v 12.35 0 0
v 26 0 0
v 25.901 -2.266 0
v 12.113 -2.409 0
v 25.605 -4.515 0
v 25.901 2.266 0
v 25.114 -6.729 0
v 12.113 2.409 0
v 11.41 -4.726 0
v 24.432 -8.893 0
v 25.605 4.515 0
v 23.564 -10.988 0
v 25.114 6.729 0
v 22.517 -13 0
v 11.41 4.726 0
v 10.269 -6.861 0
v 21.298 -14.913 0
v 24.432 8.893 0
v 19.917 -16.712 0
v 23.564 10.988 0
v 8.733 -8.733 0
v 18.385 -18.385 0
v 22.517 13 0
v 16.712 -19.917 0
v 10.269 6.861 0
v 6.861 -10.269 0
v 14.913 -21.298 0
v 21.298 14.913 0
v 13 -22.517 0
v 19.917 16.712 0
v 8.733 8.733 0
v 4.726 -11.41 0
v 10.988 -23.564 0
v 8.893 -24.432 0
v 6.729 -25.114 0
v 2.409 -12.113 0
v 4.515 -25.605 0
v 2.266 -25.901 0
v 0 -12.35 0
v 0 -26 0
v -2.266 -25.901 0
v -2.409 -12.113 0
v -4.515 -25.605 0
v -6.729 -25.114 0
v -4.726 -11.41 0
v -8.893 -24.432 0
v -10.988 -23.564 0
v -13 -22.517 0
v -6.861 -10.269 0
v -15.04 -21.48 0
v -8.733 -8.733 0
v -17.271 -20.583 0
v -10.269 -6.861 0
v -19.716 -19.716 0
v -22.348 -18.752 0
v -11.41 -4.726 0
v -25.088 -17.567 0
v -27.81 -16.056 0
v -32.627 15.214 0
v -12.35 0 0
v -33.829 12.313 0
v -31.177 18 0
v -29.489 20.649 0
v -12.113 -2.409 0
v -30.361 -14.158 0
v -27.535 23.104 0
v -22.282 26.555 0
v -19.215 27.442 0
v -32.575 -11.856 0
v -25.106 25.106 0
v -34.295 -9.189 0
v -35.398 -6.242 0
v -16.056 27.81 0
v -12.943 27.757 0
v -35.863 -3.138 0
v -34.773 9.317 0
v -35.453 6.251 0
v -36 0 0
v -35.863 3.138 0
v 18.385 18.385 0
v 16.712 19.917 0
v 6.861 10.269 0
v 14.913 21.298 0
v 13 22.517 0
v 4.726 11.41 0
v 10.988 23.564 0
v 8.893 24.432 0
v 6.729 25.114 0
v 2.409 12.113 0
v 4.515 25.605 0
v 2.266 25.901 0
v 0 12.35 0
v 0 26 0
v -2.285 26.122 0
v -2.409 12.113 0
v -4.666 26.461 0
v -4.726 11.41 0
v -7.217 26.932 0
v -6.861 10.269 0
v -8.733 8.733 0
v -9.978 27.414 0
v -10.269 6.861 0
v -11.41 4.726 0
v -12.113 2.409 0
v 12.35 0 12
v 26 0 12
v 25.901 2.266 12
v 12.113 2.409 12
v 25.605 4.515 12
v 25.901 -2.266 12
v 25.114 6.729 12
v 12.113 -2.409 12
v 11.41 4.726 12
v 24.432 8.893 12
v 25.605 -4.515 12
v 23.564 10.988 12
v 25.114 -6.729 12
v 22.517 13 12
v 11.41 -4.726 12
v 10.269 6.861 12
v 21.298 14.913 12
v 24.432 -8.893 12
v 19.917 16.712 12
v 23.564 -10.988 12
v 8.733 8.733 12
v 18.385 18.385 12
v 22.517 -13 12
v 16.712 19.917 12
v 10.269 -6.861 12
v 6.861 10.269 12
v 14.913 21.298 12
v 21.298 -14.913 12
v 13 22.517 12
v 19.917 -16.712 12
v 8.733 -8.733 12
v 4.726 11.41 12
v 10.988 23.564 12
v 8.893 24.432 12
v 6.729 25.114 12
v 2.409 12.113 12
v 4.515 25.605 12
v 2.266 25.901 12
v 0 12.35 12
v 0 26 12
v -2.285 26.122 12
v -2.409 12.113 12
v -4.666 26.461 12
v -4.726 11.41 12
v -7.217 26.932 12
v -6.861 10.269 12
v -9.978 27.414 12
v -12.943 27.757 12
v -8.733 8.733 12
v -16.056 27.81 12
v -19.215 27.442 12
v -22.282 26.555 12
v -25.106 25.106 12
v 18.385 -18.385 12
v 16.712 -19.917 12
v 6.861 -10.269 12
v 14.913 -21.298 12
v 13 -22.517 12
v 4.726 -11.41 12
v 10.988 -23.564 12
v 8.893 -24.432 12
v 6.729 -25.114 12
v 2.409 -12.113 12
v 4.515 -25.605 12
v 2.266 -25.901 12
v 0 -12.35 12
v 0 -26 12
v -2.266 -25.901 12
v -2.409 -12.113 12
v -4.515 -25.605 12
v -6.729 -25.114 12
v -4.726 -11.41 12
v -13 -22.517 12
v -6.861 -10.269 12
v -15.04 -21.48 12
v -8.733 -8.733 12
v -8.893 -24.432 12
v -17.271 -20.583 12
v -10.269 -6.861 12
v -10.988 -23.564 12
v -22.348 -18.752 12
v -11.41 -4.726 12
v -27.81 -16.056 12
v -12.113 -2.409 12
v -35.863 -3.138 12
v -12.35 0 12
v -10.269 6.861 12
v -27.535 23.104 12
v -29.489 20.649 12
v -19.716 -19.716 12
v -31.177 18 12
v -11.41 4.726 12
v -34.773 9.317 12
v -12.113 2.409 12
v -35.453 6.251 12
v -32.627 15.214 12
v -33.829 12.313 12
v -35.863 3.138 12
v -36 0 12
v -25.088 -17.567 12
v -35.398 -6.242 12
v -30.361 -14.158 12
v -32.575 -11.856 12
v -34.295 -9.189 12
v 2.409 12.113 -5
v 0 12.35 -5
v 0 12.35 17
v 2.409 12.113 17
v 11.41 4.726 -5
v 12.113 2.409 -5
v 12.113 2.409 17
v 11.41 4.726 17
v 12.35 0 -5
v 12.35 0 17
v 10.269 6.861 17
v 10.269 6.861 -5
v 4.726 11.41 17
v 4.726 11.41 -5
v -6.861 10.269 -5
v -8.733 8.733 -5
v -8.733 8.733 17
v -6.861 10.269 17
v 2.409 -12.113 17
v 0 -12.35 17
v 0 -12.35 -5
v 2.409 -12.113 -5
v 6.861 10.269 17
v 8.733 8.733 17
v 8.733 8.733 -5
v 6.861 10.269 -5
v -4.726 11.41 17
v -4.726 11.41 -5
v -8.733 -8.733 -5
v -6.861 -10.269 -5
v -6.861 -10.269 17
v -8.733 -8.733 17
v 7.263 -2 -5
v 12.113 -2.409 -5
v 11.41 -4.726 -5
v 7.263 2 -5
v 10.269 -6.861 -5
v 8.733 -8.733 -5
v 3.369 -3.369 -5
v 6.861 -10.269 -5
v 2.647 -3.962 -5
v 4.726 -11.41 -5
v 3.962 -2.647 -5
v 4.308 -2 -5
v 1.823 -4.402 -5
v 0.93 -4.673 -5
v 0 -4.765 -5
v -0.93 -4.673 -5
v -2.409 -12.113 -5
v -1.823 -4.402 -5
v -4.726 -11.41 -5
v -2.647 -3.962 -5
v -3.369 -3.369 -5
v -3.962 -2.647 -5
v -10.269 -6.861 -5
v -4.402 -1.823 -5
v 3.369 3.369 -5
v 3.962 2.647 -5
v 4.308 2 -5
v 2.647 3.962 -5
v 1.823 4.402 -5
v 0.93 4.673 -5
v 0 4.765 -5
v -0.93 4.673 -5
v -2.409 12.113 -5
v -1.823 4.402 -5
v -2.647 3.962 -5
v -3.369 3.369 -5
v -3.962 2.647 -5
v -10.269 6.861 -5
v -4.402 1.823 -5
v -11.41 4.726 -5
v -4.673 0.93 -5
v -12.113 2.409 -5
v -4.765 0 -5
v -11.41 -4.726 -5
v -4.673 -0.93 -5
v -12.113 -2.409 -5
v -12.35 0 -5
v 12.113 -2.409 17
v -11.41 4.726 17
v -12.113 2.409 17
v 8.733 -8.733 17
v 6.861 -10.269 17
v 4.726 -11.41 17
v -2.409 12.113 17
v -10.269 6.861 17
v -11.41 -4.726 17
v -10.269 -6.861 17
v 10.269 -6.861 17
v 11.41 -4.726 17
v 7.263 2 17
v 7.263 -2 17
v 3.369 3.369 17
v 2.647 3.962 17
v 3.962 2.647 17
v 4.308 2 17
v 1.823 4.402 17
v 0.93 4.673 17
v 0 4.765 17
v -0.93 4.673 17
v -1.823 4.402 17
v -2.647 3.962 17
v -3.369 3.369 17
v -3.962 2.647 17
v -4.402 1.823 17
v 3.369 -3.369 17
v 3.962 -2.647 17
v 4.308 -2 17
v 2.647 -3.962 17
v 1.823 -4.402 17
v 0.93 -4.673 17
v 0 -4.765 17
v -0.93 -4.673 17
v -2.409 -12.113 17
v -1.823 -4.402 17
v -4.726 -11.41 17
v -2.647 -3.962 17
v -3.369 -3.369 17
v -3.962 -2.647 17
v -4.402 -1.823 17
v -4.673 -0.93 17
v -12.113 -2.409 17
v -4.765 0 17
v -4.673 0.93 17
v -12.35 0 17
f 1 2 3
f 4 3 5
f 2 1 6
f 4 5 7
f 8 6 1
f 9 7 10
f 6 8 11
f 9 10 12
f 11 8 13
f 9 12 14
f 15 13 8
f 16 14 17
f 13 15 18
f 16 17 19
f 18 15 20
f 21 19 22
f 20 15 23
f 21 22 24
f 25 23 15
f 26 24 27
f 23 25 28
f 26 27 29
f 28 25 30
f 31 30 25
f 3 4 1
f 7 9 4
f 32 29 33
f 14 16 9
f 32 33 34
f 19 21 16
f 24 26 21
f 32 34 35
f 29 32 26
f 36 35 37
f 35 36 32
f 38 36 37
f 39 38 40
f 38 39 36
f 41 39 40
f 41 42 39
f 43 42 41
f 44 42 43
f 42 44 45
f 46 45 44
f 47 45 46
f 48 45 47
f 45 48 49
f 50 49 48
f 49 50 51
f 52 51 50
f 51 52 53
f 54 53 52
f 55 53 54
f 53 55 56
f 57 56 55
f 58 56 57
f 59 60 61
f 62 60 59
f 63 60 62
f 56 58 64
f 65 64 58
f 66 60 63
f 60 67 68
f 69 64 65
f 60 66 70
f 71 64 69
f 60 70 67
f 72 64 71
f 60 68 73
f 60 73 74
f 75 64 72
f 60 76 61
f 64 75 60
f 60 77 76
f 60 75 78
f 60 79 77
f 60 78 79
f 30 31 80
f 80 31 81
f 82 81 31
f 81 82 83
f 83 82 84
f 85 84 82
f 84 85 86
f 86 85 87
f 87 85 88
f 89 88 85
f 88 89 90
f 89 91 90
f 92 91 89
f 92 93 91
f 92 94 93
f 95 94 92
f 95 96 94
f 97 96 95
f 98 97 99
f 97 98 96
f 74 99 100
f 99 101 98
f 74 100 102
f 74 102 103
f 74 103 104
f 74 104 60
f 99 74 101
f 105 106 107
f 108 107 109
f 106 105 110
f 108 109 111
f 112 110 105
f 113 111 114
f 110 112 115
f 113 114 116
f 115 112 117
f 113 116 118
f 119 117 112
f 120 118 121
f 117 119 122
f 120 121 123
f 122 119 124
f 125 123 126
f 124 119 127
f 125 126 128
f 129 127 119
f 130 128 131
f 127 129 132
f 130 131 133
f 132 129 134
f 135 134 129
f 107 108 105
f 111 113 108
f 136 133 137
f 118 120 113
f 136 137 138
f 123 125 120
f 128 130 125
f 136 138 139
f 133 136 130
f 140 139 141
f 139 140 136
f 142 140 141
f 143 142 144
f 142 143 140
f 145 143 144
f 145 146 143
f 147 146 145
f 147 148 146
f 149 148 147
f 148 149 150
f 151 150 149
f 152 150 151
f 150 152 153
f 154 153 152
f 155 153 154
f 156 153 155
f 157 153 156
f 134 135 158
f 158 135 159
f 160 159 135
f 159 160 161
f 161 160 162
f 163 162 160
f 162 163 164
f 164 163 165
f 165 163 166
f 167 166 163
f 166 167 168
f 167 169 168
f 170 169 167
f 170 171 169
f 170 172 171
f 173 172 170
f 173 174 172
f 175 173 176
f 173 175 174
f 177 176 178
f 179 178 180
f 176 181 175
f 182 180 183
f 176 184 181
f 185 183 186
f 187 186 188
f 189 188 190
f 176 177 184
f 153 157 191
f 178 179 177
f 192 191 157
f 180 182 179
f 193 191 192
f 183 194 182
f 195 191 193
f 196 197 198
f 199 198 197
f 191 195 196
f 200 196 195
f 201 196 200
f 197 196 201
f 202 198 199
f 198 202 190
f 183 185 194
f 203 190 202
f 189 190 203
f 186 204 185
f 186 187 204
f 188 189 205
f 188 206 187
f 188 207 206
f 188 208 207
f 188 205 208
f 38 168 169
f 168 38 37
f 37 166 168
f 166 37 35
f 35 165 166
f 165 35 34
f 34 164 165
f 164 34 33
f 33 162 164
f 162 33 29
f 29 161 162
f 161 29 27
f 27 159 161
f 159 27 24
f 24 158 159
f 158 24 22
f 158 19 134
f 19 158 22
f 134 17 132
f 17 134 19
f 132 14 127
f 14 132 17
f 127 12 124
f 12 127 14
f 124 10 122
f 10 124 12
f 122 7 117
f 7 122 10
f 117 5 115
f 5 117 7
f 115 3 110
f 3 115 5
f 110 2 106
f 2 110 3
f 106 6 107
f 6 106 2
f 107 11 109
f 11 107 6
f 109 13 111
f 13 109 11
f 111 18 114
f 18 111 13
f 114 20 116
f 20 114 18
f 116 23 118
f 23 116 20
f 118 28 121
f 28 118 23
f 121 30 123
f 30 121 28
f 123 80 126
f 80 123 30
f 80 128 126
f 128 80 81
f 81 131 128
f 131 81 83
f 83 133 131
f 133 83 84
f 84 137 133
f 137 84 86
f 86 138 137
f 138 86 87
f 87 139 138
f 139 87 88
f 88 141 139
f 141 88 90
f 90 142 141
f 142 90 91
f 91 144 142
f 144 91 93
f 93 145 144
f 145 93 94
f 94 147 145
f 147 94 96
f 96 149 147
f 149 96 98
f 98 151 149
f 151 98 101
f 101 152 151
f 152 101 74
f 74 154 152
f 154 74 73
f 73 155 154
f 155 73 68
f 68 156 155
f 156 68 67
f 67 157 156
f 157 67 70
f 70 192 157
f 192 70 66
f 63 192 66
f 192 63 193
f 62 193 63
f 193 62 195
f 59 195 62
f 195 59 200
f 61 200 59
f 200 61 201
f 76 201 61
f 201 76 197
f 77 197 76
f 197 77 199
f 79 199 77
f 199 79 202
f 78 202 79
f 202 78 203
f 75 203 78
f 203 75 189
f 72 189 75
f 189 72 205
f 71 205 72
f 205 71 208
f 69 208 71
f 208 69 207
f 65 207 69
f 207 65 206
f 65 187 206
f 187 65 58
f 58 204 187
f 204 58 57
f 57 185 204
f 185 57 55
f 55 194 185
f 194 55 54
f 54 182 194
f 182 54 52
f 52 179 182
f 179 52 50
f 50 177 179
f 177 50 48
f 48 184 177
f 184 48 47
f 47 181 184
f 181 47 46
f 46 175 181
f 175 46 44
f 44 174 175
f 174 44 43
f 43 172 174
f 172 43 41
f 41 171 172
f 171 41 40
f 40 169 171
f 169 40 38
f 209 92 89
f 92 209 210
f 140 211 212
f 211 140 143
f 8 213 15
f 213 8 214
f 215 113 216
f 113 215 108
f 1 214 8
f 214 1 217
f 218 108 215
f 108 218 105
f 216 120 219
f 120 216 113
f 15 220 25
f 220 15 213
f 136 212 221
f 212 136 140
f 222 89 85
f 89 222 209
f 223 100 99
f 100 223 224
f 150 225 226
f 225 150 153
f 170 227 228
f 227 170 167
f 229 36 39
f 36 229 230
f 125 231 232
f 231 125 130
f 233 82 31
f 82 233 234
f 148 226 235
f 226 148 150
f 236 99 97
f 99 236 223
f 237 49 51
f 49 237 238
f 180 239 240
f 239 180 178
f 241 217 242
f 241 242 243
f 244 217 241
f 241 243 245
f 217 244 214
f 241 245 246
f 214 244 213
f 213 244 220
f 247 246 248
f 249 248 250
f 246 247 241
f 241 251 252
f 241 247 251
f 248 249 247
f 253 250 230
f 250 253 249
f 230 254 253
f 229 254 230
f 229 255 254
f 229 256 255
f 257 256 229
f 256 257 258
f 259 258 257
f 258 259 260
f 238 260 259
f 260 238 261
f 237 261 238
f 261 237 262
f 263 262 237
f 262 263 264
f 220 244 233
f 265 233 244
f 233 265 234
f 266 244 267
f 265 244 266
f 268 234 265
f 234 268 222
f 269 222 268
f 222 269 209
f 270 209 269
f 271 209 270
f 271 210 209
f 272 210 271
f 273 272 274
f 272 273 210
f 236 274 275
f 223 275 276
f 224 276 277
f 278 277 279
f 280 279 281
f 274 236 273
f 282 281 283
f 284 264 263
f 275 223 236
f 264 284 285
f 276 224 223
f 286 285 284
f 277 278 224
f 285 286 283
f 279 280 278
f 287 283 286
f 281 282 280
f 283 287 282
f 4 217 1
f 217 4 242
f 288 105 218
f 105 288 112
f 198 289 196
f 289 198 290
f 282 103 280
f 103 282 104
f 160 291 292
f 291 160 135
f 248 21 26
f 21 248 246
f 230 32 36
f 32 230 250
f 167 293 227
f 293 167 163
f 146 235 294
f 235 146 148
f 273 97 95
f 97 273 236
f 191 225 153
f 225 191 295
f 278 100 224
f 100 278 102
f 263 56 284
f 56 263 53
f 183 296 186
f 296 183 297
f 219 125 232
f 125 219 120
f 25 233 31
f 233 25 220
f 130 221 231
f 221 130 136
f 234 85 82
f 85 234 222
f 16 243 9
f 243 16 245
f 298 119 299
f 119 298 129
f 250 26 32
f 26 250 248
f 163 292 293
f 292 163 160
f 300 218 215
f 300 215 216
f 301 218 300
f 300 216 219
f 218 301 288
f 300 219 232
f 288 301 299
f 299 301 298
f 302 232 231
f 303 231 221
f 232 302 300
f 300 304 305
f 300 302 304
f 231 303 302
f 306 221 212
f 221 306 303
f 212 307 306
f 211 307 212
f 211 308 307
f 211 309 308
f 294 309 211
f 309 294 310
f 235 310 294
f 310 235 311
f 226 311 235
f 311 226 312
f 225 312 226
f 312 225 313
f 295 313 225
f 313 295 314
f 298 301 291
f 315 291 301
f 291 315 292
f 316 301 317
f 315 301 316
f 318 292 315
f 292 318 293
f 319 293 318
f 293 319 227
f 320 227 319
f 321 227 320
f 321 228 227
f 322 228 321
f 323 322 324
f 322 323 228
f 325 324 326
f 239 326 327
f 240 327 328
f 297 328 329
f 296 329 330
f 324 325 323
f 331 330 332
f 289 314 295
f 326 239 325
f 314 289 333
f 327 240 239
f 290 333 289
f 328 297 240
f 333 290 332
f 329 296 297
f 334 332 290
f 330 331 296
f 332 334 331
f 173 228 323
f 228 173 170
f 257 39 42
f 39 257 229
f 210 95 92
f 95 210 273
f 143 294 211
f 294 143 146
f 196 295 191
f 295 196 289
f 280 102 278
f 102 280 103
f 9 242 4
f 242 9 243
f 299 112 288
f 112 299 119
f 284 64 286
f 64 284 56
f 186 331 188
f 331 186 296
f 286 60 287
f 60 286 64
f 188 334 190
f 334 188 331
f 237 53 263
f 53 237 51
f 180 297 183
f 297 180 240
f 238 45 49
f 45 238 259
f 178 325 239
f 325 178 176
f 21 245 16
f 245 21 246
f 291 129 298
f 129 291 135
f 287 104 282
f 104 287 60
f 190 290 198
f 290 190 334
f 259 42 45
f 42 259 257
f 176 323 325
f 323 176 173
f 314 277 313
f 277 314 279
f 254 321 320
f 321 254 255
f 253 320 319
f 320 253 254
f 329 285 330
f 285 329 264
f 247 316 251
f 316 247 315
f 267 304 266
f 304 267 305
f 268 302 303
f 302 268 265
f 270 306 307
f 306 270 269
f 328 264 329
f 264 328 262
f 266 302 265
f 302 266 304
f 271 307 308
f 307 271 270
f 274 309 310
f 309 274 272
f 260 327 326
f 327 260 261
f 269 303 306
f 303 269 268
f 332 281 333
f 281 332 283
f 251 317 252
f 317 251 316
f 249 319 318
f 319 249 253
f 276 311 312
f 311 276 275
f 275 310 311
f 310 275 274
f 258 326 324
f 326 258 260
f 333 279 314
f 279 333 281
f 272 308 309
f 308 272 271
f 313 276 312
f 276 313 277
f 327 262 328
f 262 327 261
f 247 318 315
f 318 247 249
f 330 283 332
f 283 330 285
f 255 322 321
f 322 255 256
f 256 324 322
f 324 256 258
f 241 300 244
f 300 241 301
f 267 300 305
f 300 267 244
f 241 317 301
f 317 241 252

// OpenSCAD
$fn = 32;

// ----------------------------------------------------------------------
// Cam: base radius 26 mm with a 10 mm lift over 150 degrees
// ----------------------------------------------------------------------

// --- parameters (mm) ---
base_r = 26;              // base radius
lift = 10;                // lift height above the base radius
lift_span = 150;          // angular width of the lift
lift_start = 90;          // angle where the lift starts
cam_t = 12;               // cam plate thickness
hub_d = 24.7;             // hub diameter
hub_h = 22;               // hub height
bore_d = 9.53;            // bore
key_w = 4;                // keyway width
key_depth = 2;            // keyway depth

cam_profile = [[26, 0], [25.901, 2.266], [25.605, 4.515], [25.114, 6.729], [24.432, 8.893], [23.564, 10.988], [22.517, 13], [21.298, 14.913], [19.917, 16.712], [18.385, 18.385], [16.712, 19.917], [14.913, 21.298], [13, 22.517], [10.988, 23.564], [8.893, 24.432], [6.729, 25.114], [4.515, 25.605], [2.266, 25.901], [0, 26], [-2.285, 26.122], [-4.666, 26.461], [-7.217, 26.932], [-9.978, 27.414], [-12.943, 27.757], [-16.056, 27.81], [-19.215, 27.442], [-22.282, 26.555], [-25.106, 25.106], [-27.535, 23.104], [-29.489, 20.649], [-31.177, 18], [-32.627, 15.214], [-33.829, 12.313], [-34.773, 9.317], [-35.453, 6.251], [-35.863, 3.138], [-36, 0], [-35.863, -3.138], [-35.398, -6.242], [-34.295, -9.189], [-32.575, -11.856], [-30.361, -14.158], [-27.81, -16.056], [-25.088, -17.567], [-22.348, -18.752], [-19.716, -19.716], [-17.271, -20.583], [-15.04, -21.48], [-13, -22.517], [-10.988, -23.564], [-8.893, -24.432], [-6.729, -25.114], [-4.515, -25.605], [-2.266, -25.901], [0, -26], [2.266, -25.901], [4.515, -25.605], [6.729, -25.114], [8.893, -24.432], [10.988, -23.564], [13, -22.517], [14.913, -21.298], [16.712, -19.917], [18.385, -18.385], [19.917, -16.712], [21.298, -14.913], [22.517, -13], [23.564, -10.988], [24.432, -8.893], [25.114, -6.729], [25.605, -4.515], [25.901, -2.266]];

difference() {
  union() {
    linear_extrude(height = cam_t) polygon(cam_profile);
    /* hub, proud of the cam plate on both sides */
    translate([0, 0, -5]) cylinder(h = hub_h, d = hub_d);
  }
  /* bore through the hub, 2.5 mm clear on both faces */
  translate([0, 0, -7.5]) cylinder(h = hub_h + 5, d = bore_d);
  /* keyway, milled through the whole hub */
  translate([2.763, -2, -7.5]) cube([4.5, 4, 27]);
}
